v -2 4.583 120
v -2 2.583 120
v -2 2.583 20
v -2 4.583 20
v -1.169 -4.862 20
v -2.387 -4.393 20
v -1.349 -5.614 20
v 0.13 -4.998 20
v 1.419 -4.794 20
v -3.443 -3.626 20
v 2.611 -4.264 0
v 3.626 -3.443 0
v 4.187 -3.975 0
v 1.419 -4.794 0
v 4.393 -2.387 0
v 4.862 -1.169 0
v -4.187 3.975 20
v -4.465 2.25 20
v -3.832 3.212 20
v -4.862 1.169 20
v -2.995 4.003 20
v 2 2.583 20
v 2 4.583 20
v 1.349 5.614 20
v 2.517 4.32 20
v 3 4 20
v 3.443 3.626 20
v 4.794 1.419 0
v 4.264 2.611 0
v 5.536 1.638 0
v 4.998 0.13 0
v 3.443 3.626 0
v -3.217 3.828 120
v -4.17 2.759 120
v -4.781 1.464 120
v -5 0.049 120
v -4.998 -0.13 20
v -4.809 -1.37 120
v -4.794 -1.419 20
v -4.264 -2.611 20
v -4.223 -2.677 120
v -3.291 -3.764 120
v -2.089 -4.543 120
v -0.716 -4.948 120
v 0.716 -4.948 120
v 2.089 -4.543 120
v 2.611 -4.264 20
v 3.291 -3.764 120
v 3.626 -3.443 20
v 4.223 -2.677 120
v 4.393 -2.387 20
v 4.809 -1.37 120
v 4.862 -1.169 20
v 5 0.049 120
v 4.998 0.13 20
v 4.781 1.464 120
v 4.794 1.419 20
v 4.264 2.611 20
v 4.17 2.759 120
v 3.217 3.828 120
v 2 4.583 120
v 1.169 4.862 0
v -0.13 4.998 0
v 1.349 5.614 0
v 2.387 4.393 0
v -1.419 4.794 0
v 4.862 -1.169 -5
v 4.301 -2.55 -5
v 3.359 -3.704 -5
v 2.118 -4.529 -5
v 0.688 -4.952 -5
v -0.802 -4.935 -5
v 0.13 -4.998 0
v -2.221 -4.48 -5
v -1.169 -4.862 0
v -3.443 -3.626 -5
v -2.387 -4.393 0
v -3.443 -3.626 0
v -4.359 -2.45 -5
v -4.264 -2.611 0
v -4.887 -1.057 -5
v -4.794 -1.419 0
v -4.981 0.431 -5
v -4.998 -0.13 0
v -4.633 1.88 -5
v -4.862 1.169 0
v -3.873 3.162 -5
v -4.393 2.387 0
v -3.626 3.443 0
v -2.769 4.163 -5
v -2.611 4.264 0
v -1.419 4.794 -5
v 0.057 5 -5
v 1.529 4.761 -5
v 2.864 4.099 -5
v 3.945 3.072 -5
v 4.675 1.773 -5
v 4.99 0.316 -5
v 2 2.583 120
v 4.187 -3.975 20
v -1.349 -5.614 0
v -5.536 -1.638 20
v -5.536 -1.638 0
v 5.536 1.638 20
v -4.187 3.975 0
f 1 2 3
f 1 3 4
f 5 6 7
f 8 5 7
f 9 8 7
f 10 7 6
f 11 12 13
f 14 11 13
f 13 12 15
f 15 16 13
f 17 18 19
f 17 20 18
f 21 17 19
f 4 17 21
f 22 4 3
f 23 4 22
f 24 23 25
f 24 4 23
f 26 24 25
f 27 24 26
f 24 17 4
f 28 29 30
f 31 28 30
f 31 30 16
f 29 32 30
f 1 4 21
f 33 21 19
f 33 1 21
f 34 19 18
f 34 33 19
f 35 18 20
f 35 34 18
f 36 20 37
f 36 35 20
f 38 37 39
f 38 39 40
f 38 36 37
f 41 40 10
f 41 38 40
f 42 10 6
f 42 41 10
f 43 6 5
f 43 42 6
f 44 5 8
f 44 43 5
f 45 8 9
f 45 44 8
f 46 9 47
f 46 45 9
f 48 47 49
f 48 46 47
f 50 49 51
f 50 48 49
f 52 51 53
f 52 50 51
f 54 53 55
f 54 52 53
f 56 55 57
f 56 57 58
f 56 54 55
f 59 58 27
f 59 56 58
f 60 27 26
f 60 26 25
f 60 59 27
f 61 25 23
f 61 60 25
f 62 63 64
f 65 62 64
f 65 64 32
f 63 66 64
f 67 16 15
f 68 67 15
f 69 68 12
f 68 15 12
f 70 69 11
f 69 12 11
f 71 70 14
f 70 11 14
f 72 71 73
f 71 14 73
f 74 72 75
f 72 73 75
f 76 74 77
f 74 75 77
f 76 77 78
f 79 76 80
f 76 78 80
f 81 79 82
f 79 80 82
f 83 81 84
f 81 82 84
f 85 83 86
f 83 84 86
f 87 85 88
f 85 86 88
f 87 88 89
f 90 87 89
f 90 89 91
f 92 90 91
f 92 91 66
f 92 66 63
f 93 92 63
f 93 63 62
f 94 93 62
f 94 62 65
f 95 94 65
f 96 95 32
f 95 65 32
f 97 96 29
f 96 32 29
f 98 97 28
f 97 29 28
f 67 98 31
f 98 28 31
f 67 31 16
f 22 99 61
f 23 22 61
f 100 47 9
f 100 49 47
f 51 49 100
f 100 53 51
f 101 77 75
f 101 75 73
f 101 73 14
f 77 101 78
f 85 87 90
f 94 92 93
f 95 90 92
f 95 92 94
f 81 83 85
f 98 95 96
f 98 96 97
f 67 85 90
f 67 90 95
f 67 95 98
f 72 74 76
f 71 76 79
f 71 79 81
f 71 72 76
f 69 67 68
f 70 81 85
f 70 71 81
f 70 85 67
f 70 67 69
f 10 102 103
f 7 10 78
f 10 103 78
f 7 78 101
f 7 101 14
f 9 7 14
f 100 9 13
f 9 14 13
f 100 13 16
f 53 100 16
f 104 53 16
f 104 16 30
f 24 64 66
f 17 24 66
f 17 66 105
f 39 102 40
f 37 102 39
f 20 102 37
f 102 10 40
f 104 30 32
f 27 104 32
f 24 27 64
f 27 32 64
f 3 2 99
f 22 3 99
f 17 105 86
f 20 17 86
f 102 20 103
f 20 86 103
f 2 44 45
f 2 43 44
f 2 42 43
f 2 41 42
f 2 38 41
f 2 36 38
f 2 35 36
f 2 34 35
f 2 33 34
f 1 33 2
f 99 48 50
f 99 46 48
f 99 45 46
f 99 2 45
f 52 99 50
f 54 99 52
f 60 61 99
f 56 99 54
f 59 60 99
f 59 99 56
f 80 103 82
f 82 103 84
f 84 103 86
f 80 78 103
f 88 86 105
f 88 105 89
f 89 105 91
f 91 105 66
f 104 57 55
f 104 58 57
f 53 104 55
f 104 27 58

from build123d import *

# Parameters (mm, degrees)
EXTRUDE_1_DEPTH     = 20
SKETCH_2_R          = 5
EXTRUDE_2_DEPTH     = 5
EXTRUDE_START       = 100
SKETCH_7_R          = 5
EXTRUDE_4_DEPTH     = 100
SKETCH_8_W          = 4
SKETCH_8_H          = 3
CUT_EXTRUDE_1_DEPTH = 100


with BuildPart() as part:
    # 草图1 → 凸台-拉伸1 (new body)
    with BuildSketch(Plane.XY):
        Polygon((5.536193055, 1.63826121), (1.349320701, 5.613614431), (-4.186872353, 3.975353221), (-5.536193055, -1.63826121), (-1.349320701, -5.613614431), (4.186872353, -3.975353221), align=None)
    extrude(amount=EXTRUDE_1_DEPTH)

    # 草图2 → 凸台-拉伸2 (add)
    with BuildSketch(Plane(origin=(0, 0, 0), x_dir=(-1, 0, 0), z_dir=(0, 0, -1))):
        with Locations(Location((0, 0, 0), (0, 0, 193.51554681))):
            Circle(SKETCH_2_R)
    extrude(amount=EXTRUDE_2_DEPTH)

    # 草图7 → 凸台-拉伸4 (add)
    with BuildSketch(Plane.XY.offset(20).offset(EXTRUDE_START)):
        with Locations(Location((0, 0, 0), (0, 0, 346.48445319))):
            Circle(SKETCH_7_R)
    extrude(amount=-EXTRUDE_4_DEPTH)

    # 草图8 → 切除-拉伸1 (cut)
    with BuildSketch(Plane.XY.offset(120)):
        with Locations((0, 4.082575695)):
            Rectangle(SKETCH_8_W, SKETCH_8_H)
    extrude(amount=-CUT_EXTRUDE_1_DEPTH, mode=Mode.SUBTRACT)


solid = part.part
